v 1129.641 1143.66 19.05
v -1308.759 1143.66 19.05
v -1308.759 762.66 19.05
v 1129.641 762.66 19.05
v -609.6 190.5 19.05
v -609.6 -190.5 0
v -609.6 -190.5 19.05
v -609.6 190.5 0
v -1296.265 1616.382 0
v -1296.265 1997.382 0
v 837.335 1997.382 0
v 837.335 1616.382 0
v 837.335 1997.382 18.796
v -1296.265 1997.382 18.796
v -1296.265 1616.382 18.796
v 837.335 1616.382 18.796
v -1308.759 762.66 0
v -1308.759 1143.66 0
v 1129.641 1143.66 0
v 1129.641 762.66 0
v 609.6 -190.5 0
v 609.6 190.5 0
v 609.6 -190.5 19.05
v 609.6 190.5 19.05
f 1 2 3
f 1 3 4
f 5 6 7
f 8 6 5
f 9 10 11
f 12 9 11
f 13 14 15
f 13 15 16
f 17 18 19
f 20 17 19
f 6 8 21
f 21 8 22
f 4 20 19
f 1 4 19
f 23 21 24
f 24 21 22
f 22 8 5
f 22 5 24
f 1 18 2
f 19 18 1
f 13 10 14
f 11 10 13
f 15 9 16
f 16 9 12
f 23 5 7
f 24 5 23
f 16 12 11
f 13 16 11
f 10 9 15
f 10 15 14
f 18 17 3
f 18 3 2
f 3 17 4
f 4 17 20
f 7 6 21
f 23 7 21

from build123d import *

# Parameters (mm, degrees)
F0_W     = 1219.2
F0_H     = 381
F1_DEPTH = 19.05
F2_W     = 2438.4
F2_H     = 381
F3_DEPTH = 19.05
F4_W     = 2133.6
F4_H     = 381
F5_DEPTH = 18.796
F6_W     = 2438.4
F6_H     = 381
F7_DEPTH = 19.05


with BuildPart() as f1:
    # F0 (on Top) → F1 (new body)
    with BuildSketch(Plane.XY):
        Rectangle(F0_W, F0_H)
    extrude(amount=F1_DEPTH)


with BuildPart() as f3:
    # F2 (on Top) → F3 (new body)
    with BuildSketch(Plane.XY):
        with Locations((-89.558797, 953.159571)):
            Rectangle(F2_W, F2_H)
    extrude(amount=F3_DEPTH)


with BuildPart() as f5:
    # F4 (on Top) → F5 (new body)
    with BuildSketch(Plane.XY):
        with Locations((-229.464537, 1806.882143)):
            Rectangle(F4_W, F4_H)
    extrude(amount=F5_DEPTH)


with BuildPart() as f7:
    # F6 (on Top) → F7 (new body)
    with BuildSketch(Plane.XY):
        with Locations((414.449826, -1243.419886)):
            Rectangle(F6_W, F6_H)
    extrude(amount=F7_DEPTH)


solid = Compound([f1.part, f3.part, f5.part])
